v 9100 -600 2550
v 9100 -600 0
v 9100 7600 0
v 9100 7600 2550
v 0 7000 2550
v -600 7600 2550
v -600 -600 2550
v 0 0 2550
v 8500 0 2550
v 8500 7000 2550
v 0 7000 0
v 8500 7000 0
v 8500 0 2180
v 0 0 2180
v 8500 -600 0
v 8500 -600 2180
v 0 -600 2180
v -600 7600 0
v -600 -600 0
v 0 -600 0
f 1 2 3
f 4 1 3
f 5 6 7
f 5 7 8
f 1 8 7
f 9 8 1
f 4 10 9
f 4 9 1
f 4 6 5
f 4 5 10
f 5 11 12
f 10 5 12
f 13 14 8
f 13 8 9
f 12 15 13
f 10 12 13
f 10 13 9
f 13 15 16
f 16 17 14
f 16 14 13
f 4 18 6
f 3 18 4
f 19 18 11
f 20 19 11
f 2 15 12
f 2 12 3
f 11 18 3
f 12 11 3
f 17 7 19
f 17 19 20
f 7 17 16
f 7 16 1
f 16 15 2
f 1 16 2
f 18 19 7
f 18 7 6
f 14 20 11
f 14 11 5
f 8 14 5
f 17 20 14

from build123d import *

# Parameters (mm, degrees)
F0_W     = 9700
F0_H     = 8200
F0_W_2   = 8500
F0_H_2   = 7000
F1_DEPTH = 2550
F2_W     = 8500
F2_H     = 2180
F3_DEPTH = 1000


with BuildPart() as f1:
    # F0 (on Top) → F1 (new body)
    with BuildSketch(Plane.XY):
        with Locations((4250, 3500)):
            Rectangle(F0_W, F0_H)
        with Locations((4250, 3500)):
            Rectangle(F0_W_2, F0_H_2, mode=Mode.SUBTRACT)
    extrude(amount=F1_DEPTH)

    # F2 (on face) → F3 (cut)
    with BuildSketch(Plane.XZ.offset(600)):
        with Locations((4250, 1090)):
            Rectangle(F2_W, F2_H)
    extrude(amount=-F3_DEPTH, mode=Mode.SUBTRACT)


solid = f1.part
